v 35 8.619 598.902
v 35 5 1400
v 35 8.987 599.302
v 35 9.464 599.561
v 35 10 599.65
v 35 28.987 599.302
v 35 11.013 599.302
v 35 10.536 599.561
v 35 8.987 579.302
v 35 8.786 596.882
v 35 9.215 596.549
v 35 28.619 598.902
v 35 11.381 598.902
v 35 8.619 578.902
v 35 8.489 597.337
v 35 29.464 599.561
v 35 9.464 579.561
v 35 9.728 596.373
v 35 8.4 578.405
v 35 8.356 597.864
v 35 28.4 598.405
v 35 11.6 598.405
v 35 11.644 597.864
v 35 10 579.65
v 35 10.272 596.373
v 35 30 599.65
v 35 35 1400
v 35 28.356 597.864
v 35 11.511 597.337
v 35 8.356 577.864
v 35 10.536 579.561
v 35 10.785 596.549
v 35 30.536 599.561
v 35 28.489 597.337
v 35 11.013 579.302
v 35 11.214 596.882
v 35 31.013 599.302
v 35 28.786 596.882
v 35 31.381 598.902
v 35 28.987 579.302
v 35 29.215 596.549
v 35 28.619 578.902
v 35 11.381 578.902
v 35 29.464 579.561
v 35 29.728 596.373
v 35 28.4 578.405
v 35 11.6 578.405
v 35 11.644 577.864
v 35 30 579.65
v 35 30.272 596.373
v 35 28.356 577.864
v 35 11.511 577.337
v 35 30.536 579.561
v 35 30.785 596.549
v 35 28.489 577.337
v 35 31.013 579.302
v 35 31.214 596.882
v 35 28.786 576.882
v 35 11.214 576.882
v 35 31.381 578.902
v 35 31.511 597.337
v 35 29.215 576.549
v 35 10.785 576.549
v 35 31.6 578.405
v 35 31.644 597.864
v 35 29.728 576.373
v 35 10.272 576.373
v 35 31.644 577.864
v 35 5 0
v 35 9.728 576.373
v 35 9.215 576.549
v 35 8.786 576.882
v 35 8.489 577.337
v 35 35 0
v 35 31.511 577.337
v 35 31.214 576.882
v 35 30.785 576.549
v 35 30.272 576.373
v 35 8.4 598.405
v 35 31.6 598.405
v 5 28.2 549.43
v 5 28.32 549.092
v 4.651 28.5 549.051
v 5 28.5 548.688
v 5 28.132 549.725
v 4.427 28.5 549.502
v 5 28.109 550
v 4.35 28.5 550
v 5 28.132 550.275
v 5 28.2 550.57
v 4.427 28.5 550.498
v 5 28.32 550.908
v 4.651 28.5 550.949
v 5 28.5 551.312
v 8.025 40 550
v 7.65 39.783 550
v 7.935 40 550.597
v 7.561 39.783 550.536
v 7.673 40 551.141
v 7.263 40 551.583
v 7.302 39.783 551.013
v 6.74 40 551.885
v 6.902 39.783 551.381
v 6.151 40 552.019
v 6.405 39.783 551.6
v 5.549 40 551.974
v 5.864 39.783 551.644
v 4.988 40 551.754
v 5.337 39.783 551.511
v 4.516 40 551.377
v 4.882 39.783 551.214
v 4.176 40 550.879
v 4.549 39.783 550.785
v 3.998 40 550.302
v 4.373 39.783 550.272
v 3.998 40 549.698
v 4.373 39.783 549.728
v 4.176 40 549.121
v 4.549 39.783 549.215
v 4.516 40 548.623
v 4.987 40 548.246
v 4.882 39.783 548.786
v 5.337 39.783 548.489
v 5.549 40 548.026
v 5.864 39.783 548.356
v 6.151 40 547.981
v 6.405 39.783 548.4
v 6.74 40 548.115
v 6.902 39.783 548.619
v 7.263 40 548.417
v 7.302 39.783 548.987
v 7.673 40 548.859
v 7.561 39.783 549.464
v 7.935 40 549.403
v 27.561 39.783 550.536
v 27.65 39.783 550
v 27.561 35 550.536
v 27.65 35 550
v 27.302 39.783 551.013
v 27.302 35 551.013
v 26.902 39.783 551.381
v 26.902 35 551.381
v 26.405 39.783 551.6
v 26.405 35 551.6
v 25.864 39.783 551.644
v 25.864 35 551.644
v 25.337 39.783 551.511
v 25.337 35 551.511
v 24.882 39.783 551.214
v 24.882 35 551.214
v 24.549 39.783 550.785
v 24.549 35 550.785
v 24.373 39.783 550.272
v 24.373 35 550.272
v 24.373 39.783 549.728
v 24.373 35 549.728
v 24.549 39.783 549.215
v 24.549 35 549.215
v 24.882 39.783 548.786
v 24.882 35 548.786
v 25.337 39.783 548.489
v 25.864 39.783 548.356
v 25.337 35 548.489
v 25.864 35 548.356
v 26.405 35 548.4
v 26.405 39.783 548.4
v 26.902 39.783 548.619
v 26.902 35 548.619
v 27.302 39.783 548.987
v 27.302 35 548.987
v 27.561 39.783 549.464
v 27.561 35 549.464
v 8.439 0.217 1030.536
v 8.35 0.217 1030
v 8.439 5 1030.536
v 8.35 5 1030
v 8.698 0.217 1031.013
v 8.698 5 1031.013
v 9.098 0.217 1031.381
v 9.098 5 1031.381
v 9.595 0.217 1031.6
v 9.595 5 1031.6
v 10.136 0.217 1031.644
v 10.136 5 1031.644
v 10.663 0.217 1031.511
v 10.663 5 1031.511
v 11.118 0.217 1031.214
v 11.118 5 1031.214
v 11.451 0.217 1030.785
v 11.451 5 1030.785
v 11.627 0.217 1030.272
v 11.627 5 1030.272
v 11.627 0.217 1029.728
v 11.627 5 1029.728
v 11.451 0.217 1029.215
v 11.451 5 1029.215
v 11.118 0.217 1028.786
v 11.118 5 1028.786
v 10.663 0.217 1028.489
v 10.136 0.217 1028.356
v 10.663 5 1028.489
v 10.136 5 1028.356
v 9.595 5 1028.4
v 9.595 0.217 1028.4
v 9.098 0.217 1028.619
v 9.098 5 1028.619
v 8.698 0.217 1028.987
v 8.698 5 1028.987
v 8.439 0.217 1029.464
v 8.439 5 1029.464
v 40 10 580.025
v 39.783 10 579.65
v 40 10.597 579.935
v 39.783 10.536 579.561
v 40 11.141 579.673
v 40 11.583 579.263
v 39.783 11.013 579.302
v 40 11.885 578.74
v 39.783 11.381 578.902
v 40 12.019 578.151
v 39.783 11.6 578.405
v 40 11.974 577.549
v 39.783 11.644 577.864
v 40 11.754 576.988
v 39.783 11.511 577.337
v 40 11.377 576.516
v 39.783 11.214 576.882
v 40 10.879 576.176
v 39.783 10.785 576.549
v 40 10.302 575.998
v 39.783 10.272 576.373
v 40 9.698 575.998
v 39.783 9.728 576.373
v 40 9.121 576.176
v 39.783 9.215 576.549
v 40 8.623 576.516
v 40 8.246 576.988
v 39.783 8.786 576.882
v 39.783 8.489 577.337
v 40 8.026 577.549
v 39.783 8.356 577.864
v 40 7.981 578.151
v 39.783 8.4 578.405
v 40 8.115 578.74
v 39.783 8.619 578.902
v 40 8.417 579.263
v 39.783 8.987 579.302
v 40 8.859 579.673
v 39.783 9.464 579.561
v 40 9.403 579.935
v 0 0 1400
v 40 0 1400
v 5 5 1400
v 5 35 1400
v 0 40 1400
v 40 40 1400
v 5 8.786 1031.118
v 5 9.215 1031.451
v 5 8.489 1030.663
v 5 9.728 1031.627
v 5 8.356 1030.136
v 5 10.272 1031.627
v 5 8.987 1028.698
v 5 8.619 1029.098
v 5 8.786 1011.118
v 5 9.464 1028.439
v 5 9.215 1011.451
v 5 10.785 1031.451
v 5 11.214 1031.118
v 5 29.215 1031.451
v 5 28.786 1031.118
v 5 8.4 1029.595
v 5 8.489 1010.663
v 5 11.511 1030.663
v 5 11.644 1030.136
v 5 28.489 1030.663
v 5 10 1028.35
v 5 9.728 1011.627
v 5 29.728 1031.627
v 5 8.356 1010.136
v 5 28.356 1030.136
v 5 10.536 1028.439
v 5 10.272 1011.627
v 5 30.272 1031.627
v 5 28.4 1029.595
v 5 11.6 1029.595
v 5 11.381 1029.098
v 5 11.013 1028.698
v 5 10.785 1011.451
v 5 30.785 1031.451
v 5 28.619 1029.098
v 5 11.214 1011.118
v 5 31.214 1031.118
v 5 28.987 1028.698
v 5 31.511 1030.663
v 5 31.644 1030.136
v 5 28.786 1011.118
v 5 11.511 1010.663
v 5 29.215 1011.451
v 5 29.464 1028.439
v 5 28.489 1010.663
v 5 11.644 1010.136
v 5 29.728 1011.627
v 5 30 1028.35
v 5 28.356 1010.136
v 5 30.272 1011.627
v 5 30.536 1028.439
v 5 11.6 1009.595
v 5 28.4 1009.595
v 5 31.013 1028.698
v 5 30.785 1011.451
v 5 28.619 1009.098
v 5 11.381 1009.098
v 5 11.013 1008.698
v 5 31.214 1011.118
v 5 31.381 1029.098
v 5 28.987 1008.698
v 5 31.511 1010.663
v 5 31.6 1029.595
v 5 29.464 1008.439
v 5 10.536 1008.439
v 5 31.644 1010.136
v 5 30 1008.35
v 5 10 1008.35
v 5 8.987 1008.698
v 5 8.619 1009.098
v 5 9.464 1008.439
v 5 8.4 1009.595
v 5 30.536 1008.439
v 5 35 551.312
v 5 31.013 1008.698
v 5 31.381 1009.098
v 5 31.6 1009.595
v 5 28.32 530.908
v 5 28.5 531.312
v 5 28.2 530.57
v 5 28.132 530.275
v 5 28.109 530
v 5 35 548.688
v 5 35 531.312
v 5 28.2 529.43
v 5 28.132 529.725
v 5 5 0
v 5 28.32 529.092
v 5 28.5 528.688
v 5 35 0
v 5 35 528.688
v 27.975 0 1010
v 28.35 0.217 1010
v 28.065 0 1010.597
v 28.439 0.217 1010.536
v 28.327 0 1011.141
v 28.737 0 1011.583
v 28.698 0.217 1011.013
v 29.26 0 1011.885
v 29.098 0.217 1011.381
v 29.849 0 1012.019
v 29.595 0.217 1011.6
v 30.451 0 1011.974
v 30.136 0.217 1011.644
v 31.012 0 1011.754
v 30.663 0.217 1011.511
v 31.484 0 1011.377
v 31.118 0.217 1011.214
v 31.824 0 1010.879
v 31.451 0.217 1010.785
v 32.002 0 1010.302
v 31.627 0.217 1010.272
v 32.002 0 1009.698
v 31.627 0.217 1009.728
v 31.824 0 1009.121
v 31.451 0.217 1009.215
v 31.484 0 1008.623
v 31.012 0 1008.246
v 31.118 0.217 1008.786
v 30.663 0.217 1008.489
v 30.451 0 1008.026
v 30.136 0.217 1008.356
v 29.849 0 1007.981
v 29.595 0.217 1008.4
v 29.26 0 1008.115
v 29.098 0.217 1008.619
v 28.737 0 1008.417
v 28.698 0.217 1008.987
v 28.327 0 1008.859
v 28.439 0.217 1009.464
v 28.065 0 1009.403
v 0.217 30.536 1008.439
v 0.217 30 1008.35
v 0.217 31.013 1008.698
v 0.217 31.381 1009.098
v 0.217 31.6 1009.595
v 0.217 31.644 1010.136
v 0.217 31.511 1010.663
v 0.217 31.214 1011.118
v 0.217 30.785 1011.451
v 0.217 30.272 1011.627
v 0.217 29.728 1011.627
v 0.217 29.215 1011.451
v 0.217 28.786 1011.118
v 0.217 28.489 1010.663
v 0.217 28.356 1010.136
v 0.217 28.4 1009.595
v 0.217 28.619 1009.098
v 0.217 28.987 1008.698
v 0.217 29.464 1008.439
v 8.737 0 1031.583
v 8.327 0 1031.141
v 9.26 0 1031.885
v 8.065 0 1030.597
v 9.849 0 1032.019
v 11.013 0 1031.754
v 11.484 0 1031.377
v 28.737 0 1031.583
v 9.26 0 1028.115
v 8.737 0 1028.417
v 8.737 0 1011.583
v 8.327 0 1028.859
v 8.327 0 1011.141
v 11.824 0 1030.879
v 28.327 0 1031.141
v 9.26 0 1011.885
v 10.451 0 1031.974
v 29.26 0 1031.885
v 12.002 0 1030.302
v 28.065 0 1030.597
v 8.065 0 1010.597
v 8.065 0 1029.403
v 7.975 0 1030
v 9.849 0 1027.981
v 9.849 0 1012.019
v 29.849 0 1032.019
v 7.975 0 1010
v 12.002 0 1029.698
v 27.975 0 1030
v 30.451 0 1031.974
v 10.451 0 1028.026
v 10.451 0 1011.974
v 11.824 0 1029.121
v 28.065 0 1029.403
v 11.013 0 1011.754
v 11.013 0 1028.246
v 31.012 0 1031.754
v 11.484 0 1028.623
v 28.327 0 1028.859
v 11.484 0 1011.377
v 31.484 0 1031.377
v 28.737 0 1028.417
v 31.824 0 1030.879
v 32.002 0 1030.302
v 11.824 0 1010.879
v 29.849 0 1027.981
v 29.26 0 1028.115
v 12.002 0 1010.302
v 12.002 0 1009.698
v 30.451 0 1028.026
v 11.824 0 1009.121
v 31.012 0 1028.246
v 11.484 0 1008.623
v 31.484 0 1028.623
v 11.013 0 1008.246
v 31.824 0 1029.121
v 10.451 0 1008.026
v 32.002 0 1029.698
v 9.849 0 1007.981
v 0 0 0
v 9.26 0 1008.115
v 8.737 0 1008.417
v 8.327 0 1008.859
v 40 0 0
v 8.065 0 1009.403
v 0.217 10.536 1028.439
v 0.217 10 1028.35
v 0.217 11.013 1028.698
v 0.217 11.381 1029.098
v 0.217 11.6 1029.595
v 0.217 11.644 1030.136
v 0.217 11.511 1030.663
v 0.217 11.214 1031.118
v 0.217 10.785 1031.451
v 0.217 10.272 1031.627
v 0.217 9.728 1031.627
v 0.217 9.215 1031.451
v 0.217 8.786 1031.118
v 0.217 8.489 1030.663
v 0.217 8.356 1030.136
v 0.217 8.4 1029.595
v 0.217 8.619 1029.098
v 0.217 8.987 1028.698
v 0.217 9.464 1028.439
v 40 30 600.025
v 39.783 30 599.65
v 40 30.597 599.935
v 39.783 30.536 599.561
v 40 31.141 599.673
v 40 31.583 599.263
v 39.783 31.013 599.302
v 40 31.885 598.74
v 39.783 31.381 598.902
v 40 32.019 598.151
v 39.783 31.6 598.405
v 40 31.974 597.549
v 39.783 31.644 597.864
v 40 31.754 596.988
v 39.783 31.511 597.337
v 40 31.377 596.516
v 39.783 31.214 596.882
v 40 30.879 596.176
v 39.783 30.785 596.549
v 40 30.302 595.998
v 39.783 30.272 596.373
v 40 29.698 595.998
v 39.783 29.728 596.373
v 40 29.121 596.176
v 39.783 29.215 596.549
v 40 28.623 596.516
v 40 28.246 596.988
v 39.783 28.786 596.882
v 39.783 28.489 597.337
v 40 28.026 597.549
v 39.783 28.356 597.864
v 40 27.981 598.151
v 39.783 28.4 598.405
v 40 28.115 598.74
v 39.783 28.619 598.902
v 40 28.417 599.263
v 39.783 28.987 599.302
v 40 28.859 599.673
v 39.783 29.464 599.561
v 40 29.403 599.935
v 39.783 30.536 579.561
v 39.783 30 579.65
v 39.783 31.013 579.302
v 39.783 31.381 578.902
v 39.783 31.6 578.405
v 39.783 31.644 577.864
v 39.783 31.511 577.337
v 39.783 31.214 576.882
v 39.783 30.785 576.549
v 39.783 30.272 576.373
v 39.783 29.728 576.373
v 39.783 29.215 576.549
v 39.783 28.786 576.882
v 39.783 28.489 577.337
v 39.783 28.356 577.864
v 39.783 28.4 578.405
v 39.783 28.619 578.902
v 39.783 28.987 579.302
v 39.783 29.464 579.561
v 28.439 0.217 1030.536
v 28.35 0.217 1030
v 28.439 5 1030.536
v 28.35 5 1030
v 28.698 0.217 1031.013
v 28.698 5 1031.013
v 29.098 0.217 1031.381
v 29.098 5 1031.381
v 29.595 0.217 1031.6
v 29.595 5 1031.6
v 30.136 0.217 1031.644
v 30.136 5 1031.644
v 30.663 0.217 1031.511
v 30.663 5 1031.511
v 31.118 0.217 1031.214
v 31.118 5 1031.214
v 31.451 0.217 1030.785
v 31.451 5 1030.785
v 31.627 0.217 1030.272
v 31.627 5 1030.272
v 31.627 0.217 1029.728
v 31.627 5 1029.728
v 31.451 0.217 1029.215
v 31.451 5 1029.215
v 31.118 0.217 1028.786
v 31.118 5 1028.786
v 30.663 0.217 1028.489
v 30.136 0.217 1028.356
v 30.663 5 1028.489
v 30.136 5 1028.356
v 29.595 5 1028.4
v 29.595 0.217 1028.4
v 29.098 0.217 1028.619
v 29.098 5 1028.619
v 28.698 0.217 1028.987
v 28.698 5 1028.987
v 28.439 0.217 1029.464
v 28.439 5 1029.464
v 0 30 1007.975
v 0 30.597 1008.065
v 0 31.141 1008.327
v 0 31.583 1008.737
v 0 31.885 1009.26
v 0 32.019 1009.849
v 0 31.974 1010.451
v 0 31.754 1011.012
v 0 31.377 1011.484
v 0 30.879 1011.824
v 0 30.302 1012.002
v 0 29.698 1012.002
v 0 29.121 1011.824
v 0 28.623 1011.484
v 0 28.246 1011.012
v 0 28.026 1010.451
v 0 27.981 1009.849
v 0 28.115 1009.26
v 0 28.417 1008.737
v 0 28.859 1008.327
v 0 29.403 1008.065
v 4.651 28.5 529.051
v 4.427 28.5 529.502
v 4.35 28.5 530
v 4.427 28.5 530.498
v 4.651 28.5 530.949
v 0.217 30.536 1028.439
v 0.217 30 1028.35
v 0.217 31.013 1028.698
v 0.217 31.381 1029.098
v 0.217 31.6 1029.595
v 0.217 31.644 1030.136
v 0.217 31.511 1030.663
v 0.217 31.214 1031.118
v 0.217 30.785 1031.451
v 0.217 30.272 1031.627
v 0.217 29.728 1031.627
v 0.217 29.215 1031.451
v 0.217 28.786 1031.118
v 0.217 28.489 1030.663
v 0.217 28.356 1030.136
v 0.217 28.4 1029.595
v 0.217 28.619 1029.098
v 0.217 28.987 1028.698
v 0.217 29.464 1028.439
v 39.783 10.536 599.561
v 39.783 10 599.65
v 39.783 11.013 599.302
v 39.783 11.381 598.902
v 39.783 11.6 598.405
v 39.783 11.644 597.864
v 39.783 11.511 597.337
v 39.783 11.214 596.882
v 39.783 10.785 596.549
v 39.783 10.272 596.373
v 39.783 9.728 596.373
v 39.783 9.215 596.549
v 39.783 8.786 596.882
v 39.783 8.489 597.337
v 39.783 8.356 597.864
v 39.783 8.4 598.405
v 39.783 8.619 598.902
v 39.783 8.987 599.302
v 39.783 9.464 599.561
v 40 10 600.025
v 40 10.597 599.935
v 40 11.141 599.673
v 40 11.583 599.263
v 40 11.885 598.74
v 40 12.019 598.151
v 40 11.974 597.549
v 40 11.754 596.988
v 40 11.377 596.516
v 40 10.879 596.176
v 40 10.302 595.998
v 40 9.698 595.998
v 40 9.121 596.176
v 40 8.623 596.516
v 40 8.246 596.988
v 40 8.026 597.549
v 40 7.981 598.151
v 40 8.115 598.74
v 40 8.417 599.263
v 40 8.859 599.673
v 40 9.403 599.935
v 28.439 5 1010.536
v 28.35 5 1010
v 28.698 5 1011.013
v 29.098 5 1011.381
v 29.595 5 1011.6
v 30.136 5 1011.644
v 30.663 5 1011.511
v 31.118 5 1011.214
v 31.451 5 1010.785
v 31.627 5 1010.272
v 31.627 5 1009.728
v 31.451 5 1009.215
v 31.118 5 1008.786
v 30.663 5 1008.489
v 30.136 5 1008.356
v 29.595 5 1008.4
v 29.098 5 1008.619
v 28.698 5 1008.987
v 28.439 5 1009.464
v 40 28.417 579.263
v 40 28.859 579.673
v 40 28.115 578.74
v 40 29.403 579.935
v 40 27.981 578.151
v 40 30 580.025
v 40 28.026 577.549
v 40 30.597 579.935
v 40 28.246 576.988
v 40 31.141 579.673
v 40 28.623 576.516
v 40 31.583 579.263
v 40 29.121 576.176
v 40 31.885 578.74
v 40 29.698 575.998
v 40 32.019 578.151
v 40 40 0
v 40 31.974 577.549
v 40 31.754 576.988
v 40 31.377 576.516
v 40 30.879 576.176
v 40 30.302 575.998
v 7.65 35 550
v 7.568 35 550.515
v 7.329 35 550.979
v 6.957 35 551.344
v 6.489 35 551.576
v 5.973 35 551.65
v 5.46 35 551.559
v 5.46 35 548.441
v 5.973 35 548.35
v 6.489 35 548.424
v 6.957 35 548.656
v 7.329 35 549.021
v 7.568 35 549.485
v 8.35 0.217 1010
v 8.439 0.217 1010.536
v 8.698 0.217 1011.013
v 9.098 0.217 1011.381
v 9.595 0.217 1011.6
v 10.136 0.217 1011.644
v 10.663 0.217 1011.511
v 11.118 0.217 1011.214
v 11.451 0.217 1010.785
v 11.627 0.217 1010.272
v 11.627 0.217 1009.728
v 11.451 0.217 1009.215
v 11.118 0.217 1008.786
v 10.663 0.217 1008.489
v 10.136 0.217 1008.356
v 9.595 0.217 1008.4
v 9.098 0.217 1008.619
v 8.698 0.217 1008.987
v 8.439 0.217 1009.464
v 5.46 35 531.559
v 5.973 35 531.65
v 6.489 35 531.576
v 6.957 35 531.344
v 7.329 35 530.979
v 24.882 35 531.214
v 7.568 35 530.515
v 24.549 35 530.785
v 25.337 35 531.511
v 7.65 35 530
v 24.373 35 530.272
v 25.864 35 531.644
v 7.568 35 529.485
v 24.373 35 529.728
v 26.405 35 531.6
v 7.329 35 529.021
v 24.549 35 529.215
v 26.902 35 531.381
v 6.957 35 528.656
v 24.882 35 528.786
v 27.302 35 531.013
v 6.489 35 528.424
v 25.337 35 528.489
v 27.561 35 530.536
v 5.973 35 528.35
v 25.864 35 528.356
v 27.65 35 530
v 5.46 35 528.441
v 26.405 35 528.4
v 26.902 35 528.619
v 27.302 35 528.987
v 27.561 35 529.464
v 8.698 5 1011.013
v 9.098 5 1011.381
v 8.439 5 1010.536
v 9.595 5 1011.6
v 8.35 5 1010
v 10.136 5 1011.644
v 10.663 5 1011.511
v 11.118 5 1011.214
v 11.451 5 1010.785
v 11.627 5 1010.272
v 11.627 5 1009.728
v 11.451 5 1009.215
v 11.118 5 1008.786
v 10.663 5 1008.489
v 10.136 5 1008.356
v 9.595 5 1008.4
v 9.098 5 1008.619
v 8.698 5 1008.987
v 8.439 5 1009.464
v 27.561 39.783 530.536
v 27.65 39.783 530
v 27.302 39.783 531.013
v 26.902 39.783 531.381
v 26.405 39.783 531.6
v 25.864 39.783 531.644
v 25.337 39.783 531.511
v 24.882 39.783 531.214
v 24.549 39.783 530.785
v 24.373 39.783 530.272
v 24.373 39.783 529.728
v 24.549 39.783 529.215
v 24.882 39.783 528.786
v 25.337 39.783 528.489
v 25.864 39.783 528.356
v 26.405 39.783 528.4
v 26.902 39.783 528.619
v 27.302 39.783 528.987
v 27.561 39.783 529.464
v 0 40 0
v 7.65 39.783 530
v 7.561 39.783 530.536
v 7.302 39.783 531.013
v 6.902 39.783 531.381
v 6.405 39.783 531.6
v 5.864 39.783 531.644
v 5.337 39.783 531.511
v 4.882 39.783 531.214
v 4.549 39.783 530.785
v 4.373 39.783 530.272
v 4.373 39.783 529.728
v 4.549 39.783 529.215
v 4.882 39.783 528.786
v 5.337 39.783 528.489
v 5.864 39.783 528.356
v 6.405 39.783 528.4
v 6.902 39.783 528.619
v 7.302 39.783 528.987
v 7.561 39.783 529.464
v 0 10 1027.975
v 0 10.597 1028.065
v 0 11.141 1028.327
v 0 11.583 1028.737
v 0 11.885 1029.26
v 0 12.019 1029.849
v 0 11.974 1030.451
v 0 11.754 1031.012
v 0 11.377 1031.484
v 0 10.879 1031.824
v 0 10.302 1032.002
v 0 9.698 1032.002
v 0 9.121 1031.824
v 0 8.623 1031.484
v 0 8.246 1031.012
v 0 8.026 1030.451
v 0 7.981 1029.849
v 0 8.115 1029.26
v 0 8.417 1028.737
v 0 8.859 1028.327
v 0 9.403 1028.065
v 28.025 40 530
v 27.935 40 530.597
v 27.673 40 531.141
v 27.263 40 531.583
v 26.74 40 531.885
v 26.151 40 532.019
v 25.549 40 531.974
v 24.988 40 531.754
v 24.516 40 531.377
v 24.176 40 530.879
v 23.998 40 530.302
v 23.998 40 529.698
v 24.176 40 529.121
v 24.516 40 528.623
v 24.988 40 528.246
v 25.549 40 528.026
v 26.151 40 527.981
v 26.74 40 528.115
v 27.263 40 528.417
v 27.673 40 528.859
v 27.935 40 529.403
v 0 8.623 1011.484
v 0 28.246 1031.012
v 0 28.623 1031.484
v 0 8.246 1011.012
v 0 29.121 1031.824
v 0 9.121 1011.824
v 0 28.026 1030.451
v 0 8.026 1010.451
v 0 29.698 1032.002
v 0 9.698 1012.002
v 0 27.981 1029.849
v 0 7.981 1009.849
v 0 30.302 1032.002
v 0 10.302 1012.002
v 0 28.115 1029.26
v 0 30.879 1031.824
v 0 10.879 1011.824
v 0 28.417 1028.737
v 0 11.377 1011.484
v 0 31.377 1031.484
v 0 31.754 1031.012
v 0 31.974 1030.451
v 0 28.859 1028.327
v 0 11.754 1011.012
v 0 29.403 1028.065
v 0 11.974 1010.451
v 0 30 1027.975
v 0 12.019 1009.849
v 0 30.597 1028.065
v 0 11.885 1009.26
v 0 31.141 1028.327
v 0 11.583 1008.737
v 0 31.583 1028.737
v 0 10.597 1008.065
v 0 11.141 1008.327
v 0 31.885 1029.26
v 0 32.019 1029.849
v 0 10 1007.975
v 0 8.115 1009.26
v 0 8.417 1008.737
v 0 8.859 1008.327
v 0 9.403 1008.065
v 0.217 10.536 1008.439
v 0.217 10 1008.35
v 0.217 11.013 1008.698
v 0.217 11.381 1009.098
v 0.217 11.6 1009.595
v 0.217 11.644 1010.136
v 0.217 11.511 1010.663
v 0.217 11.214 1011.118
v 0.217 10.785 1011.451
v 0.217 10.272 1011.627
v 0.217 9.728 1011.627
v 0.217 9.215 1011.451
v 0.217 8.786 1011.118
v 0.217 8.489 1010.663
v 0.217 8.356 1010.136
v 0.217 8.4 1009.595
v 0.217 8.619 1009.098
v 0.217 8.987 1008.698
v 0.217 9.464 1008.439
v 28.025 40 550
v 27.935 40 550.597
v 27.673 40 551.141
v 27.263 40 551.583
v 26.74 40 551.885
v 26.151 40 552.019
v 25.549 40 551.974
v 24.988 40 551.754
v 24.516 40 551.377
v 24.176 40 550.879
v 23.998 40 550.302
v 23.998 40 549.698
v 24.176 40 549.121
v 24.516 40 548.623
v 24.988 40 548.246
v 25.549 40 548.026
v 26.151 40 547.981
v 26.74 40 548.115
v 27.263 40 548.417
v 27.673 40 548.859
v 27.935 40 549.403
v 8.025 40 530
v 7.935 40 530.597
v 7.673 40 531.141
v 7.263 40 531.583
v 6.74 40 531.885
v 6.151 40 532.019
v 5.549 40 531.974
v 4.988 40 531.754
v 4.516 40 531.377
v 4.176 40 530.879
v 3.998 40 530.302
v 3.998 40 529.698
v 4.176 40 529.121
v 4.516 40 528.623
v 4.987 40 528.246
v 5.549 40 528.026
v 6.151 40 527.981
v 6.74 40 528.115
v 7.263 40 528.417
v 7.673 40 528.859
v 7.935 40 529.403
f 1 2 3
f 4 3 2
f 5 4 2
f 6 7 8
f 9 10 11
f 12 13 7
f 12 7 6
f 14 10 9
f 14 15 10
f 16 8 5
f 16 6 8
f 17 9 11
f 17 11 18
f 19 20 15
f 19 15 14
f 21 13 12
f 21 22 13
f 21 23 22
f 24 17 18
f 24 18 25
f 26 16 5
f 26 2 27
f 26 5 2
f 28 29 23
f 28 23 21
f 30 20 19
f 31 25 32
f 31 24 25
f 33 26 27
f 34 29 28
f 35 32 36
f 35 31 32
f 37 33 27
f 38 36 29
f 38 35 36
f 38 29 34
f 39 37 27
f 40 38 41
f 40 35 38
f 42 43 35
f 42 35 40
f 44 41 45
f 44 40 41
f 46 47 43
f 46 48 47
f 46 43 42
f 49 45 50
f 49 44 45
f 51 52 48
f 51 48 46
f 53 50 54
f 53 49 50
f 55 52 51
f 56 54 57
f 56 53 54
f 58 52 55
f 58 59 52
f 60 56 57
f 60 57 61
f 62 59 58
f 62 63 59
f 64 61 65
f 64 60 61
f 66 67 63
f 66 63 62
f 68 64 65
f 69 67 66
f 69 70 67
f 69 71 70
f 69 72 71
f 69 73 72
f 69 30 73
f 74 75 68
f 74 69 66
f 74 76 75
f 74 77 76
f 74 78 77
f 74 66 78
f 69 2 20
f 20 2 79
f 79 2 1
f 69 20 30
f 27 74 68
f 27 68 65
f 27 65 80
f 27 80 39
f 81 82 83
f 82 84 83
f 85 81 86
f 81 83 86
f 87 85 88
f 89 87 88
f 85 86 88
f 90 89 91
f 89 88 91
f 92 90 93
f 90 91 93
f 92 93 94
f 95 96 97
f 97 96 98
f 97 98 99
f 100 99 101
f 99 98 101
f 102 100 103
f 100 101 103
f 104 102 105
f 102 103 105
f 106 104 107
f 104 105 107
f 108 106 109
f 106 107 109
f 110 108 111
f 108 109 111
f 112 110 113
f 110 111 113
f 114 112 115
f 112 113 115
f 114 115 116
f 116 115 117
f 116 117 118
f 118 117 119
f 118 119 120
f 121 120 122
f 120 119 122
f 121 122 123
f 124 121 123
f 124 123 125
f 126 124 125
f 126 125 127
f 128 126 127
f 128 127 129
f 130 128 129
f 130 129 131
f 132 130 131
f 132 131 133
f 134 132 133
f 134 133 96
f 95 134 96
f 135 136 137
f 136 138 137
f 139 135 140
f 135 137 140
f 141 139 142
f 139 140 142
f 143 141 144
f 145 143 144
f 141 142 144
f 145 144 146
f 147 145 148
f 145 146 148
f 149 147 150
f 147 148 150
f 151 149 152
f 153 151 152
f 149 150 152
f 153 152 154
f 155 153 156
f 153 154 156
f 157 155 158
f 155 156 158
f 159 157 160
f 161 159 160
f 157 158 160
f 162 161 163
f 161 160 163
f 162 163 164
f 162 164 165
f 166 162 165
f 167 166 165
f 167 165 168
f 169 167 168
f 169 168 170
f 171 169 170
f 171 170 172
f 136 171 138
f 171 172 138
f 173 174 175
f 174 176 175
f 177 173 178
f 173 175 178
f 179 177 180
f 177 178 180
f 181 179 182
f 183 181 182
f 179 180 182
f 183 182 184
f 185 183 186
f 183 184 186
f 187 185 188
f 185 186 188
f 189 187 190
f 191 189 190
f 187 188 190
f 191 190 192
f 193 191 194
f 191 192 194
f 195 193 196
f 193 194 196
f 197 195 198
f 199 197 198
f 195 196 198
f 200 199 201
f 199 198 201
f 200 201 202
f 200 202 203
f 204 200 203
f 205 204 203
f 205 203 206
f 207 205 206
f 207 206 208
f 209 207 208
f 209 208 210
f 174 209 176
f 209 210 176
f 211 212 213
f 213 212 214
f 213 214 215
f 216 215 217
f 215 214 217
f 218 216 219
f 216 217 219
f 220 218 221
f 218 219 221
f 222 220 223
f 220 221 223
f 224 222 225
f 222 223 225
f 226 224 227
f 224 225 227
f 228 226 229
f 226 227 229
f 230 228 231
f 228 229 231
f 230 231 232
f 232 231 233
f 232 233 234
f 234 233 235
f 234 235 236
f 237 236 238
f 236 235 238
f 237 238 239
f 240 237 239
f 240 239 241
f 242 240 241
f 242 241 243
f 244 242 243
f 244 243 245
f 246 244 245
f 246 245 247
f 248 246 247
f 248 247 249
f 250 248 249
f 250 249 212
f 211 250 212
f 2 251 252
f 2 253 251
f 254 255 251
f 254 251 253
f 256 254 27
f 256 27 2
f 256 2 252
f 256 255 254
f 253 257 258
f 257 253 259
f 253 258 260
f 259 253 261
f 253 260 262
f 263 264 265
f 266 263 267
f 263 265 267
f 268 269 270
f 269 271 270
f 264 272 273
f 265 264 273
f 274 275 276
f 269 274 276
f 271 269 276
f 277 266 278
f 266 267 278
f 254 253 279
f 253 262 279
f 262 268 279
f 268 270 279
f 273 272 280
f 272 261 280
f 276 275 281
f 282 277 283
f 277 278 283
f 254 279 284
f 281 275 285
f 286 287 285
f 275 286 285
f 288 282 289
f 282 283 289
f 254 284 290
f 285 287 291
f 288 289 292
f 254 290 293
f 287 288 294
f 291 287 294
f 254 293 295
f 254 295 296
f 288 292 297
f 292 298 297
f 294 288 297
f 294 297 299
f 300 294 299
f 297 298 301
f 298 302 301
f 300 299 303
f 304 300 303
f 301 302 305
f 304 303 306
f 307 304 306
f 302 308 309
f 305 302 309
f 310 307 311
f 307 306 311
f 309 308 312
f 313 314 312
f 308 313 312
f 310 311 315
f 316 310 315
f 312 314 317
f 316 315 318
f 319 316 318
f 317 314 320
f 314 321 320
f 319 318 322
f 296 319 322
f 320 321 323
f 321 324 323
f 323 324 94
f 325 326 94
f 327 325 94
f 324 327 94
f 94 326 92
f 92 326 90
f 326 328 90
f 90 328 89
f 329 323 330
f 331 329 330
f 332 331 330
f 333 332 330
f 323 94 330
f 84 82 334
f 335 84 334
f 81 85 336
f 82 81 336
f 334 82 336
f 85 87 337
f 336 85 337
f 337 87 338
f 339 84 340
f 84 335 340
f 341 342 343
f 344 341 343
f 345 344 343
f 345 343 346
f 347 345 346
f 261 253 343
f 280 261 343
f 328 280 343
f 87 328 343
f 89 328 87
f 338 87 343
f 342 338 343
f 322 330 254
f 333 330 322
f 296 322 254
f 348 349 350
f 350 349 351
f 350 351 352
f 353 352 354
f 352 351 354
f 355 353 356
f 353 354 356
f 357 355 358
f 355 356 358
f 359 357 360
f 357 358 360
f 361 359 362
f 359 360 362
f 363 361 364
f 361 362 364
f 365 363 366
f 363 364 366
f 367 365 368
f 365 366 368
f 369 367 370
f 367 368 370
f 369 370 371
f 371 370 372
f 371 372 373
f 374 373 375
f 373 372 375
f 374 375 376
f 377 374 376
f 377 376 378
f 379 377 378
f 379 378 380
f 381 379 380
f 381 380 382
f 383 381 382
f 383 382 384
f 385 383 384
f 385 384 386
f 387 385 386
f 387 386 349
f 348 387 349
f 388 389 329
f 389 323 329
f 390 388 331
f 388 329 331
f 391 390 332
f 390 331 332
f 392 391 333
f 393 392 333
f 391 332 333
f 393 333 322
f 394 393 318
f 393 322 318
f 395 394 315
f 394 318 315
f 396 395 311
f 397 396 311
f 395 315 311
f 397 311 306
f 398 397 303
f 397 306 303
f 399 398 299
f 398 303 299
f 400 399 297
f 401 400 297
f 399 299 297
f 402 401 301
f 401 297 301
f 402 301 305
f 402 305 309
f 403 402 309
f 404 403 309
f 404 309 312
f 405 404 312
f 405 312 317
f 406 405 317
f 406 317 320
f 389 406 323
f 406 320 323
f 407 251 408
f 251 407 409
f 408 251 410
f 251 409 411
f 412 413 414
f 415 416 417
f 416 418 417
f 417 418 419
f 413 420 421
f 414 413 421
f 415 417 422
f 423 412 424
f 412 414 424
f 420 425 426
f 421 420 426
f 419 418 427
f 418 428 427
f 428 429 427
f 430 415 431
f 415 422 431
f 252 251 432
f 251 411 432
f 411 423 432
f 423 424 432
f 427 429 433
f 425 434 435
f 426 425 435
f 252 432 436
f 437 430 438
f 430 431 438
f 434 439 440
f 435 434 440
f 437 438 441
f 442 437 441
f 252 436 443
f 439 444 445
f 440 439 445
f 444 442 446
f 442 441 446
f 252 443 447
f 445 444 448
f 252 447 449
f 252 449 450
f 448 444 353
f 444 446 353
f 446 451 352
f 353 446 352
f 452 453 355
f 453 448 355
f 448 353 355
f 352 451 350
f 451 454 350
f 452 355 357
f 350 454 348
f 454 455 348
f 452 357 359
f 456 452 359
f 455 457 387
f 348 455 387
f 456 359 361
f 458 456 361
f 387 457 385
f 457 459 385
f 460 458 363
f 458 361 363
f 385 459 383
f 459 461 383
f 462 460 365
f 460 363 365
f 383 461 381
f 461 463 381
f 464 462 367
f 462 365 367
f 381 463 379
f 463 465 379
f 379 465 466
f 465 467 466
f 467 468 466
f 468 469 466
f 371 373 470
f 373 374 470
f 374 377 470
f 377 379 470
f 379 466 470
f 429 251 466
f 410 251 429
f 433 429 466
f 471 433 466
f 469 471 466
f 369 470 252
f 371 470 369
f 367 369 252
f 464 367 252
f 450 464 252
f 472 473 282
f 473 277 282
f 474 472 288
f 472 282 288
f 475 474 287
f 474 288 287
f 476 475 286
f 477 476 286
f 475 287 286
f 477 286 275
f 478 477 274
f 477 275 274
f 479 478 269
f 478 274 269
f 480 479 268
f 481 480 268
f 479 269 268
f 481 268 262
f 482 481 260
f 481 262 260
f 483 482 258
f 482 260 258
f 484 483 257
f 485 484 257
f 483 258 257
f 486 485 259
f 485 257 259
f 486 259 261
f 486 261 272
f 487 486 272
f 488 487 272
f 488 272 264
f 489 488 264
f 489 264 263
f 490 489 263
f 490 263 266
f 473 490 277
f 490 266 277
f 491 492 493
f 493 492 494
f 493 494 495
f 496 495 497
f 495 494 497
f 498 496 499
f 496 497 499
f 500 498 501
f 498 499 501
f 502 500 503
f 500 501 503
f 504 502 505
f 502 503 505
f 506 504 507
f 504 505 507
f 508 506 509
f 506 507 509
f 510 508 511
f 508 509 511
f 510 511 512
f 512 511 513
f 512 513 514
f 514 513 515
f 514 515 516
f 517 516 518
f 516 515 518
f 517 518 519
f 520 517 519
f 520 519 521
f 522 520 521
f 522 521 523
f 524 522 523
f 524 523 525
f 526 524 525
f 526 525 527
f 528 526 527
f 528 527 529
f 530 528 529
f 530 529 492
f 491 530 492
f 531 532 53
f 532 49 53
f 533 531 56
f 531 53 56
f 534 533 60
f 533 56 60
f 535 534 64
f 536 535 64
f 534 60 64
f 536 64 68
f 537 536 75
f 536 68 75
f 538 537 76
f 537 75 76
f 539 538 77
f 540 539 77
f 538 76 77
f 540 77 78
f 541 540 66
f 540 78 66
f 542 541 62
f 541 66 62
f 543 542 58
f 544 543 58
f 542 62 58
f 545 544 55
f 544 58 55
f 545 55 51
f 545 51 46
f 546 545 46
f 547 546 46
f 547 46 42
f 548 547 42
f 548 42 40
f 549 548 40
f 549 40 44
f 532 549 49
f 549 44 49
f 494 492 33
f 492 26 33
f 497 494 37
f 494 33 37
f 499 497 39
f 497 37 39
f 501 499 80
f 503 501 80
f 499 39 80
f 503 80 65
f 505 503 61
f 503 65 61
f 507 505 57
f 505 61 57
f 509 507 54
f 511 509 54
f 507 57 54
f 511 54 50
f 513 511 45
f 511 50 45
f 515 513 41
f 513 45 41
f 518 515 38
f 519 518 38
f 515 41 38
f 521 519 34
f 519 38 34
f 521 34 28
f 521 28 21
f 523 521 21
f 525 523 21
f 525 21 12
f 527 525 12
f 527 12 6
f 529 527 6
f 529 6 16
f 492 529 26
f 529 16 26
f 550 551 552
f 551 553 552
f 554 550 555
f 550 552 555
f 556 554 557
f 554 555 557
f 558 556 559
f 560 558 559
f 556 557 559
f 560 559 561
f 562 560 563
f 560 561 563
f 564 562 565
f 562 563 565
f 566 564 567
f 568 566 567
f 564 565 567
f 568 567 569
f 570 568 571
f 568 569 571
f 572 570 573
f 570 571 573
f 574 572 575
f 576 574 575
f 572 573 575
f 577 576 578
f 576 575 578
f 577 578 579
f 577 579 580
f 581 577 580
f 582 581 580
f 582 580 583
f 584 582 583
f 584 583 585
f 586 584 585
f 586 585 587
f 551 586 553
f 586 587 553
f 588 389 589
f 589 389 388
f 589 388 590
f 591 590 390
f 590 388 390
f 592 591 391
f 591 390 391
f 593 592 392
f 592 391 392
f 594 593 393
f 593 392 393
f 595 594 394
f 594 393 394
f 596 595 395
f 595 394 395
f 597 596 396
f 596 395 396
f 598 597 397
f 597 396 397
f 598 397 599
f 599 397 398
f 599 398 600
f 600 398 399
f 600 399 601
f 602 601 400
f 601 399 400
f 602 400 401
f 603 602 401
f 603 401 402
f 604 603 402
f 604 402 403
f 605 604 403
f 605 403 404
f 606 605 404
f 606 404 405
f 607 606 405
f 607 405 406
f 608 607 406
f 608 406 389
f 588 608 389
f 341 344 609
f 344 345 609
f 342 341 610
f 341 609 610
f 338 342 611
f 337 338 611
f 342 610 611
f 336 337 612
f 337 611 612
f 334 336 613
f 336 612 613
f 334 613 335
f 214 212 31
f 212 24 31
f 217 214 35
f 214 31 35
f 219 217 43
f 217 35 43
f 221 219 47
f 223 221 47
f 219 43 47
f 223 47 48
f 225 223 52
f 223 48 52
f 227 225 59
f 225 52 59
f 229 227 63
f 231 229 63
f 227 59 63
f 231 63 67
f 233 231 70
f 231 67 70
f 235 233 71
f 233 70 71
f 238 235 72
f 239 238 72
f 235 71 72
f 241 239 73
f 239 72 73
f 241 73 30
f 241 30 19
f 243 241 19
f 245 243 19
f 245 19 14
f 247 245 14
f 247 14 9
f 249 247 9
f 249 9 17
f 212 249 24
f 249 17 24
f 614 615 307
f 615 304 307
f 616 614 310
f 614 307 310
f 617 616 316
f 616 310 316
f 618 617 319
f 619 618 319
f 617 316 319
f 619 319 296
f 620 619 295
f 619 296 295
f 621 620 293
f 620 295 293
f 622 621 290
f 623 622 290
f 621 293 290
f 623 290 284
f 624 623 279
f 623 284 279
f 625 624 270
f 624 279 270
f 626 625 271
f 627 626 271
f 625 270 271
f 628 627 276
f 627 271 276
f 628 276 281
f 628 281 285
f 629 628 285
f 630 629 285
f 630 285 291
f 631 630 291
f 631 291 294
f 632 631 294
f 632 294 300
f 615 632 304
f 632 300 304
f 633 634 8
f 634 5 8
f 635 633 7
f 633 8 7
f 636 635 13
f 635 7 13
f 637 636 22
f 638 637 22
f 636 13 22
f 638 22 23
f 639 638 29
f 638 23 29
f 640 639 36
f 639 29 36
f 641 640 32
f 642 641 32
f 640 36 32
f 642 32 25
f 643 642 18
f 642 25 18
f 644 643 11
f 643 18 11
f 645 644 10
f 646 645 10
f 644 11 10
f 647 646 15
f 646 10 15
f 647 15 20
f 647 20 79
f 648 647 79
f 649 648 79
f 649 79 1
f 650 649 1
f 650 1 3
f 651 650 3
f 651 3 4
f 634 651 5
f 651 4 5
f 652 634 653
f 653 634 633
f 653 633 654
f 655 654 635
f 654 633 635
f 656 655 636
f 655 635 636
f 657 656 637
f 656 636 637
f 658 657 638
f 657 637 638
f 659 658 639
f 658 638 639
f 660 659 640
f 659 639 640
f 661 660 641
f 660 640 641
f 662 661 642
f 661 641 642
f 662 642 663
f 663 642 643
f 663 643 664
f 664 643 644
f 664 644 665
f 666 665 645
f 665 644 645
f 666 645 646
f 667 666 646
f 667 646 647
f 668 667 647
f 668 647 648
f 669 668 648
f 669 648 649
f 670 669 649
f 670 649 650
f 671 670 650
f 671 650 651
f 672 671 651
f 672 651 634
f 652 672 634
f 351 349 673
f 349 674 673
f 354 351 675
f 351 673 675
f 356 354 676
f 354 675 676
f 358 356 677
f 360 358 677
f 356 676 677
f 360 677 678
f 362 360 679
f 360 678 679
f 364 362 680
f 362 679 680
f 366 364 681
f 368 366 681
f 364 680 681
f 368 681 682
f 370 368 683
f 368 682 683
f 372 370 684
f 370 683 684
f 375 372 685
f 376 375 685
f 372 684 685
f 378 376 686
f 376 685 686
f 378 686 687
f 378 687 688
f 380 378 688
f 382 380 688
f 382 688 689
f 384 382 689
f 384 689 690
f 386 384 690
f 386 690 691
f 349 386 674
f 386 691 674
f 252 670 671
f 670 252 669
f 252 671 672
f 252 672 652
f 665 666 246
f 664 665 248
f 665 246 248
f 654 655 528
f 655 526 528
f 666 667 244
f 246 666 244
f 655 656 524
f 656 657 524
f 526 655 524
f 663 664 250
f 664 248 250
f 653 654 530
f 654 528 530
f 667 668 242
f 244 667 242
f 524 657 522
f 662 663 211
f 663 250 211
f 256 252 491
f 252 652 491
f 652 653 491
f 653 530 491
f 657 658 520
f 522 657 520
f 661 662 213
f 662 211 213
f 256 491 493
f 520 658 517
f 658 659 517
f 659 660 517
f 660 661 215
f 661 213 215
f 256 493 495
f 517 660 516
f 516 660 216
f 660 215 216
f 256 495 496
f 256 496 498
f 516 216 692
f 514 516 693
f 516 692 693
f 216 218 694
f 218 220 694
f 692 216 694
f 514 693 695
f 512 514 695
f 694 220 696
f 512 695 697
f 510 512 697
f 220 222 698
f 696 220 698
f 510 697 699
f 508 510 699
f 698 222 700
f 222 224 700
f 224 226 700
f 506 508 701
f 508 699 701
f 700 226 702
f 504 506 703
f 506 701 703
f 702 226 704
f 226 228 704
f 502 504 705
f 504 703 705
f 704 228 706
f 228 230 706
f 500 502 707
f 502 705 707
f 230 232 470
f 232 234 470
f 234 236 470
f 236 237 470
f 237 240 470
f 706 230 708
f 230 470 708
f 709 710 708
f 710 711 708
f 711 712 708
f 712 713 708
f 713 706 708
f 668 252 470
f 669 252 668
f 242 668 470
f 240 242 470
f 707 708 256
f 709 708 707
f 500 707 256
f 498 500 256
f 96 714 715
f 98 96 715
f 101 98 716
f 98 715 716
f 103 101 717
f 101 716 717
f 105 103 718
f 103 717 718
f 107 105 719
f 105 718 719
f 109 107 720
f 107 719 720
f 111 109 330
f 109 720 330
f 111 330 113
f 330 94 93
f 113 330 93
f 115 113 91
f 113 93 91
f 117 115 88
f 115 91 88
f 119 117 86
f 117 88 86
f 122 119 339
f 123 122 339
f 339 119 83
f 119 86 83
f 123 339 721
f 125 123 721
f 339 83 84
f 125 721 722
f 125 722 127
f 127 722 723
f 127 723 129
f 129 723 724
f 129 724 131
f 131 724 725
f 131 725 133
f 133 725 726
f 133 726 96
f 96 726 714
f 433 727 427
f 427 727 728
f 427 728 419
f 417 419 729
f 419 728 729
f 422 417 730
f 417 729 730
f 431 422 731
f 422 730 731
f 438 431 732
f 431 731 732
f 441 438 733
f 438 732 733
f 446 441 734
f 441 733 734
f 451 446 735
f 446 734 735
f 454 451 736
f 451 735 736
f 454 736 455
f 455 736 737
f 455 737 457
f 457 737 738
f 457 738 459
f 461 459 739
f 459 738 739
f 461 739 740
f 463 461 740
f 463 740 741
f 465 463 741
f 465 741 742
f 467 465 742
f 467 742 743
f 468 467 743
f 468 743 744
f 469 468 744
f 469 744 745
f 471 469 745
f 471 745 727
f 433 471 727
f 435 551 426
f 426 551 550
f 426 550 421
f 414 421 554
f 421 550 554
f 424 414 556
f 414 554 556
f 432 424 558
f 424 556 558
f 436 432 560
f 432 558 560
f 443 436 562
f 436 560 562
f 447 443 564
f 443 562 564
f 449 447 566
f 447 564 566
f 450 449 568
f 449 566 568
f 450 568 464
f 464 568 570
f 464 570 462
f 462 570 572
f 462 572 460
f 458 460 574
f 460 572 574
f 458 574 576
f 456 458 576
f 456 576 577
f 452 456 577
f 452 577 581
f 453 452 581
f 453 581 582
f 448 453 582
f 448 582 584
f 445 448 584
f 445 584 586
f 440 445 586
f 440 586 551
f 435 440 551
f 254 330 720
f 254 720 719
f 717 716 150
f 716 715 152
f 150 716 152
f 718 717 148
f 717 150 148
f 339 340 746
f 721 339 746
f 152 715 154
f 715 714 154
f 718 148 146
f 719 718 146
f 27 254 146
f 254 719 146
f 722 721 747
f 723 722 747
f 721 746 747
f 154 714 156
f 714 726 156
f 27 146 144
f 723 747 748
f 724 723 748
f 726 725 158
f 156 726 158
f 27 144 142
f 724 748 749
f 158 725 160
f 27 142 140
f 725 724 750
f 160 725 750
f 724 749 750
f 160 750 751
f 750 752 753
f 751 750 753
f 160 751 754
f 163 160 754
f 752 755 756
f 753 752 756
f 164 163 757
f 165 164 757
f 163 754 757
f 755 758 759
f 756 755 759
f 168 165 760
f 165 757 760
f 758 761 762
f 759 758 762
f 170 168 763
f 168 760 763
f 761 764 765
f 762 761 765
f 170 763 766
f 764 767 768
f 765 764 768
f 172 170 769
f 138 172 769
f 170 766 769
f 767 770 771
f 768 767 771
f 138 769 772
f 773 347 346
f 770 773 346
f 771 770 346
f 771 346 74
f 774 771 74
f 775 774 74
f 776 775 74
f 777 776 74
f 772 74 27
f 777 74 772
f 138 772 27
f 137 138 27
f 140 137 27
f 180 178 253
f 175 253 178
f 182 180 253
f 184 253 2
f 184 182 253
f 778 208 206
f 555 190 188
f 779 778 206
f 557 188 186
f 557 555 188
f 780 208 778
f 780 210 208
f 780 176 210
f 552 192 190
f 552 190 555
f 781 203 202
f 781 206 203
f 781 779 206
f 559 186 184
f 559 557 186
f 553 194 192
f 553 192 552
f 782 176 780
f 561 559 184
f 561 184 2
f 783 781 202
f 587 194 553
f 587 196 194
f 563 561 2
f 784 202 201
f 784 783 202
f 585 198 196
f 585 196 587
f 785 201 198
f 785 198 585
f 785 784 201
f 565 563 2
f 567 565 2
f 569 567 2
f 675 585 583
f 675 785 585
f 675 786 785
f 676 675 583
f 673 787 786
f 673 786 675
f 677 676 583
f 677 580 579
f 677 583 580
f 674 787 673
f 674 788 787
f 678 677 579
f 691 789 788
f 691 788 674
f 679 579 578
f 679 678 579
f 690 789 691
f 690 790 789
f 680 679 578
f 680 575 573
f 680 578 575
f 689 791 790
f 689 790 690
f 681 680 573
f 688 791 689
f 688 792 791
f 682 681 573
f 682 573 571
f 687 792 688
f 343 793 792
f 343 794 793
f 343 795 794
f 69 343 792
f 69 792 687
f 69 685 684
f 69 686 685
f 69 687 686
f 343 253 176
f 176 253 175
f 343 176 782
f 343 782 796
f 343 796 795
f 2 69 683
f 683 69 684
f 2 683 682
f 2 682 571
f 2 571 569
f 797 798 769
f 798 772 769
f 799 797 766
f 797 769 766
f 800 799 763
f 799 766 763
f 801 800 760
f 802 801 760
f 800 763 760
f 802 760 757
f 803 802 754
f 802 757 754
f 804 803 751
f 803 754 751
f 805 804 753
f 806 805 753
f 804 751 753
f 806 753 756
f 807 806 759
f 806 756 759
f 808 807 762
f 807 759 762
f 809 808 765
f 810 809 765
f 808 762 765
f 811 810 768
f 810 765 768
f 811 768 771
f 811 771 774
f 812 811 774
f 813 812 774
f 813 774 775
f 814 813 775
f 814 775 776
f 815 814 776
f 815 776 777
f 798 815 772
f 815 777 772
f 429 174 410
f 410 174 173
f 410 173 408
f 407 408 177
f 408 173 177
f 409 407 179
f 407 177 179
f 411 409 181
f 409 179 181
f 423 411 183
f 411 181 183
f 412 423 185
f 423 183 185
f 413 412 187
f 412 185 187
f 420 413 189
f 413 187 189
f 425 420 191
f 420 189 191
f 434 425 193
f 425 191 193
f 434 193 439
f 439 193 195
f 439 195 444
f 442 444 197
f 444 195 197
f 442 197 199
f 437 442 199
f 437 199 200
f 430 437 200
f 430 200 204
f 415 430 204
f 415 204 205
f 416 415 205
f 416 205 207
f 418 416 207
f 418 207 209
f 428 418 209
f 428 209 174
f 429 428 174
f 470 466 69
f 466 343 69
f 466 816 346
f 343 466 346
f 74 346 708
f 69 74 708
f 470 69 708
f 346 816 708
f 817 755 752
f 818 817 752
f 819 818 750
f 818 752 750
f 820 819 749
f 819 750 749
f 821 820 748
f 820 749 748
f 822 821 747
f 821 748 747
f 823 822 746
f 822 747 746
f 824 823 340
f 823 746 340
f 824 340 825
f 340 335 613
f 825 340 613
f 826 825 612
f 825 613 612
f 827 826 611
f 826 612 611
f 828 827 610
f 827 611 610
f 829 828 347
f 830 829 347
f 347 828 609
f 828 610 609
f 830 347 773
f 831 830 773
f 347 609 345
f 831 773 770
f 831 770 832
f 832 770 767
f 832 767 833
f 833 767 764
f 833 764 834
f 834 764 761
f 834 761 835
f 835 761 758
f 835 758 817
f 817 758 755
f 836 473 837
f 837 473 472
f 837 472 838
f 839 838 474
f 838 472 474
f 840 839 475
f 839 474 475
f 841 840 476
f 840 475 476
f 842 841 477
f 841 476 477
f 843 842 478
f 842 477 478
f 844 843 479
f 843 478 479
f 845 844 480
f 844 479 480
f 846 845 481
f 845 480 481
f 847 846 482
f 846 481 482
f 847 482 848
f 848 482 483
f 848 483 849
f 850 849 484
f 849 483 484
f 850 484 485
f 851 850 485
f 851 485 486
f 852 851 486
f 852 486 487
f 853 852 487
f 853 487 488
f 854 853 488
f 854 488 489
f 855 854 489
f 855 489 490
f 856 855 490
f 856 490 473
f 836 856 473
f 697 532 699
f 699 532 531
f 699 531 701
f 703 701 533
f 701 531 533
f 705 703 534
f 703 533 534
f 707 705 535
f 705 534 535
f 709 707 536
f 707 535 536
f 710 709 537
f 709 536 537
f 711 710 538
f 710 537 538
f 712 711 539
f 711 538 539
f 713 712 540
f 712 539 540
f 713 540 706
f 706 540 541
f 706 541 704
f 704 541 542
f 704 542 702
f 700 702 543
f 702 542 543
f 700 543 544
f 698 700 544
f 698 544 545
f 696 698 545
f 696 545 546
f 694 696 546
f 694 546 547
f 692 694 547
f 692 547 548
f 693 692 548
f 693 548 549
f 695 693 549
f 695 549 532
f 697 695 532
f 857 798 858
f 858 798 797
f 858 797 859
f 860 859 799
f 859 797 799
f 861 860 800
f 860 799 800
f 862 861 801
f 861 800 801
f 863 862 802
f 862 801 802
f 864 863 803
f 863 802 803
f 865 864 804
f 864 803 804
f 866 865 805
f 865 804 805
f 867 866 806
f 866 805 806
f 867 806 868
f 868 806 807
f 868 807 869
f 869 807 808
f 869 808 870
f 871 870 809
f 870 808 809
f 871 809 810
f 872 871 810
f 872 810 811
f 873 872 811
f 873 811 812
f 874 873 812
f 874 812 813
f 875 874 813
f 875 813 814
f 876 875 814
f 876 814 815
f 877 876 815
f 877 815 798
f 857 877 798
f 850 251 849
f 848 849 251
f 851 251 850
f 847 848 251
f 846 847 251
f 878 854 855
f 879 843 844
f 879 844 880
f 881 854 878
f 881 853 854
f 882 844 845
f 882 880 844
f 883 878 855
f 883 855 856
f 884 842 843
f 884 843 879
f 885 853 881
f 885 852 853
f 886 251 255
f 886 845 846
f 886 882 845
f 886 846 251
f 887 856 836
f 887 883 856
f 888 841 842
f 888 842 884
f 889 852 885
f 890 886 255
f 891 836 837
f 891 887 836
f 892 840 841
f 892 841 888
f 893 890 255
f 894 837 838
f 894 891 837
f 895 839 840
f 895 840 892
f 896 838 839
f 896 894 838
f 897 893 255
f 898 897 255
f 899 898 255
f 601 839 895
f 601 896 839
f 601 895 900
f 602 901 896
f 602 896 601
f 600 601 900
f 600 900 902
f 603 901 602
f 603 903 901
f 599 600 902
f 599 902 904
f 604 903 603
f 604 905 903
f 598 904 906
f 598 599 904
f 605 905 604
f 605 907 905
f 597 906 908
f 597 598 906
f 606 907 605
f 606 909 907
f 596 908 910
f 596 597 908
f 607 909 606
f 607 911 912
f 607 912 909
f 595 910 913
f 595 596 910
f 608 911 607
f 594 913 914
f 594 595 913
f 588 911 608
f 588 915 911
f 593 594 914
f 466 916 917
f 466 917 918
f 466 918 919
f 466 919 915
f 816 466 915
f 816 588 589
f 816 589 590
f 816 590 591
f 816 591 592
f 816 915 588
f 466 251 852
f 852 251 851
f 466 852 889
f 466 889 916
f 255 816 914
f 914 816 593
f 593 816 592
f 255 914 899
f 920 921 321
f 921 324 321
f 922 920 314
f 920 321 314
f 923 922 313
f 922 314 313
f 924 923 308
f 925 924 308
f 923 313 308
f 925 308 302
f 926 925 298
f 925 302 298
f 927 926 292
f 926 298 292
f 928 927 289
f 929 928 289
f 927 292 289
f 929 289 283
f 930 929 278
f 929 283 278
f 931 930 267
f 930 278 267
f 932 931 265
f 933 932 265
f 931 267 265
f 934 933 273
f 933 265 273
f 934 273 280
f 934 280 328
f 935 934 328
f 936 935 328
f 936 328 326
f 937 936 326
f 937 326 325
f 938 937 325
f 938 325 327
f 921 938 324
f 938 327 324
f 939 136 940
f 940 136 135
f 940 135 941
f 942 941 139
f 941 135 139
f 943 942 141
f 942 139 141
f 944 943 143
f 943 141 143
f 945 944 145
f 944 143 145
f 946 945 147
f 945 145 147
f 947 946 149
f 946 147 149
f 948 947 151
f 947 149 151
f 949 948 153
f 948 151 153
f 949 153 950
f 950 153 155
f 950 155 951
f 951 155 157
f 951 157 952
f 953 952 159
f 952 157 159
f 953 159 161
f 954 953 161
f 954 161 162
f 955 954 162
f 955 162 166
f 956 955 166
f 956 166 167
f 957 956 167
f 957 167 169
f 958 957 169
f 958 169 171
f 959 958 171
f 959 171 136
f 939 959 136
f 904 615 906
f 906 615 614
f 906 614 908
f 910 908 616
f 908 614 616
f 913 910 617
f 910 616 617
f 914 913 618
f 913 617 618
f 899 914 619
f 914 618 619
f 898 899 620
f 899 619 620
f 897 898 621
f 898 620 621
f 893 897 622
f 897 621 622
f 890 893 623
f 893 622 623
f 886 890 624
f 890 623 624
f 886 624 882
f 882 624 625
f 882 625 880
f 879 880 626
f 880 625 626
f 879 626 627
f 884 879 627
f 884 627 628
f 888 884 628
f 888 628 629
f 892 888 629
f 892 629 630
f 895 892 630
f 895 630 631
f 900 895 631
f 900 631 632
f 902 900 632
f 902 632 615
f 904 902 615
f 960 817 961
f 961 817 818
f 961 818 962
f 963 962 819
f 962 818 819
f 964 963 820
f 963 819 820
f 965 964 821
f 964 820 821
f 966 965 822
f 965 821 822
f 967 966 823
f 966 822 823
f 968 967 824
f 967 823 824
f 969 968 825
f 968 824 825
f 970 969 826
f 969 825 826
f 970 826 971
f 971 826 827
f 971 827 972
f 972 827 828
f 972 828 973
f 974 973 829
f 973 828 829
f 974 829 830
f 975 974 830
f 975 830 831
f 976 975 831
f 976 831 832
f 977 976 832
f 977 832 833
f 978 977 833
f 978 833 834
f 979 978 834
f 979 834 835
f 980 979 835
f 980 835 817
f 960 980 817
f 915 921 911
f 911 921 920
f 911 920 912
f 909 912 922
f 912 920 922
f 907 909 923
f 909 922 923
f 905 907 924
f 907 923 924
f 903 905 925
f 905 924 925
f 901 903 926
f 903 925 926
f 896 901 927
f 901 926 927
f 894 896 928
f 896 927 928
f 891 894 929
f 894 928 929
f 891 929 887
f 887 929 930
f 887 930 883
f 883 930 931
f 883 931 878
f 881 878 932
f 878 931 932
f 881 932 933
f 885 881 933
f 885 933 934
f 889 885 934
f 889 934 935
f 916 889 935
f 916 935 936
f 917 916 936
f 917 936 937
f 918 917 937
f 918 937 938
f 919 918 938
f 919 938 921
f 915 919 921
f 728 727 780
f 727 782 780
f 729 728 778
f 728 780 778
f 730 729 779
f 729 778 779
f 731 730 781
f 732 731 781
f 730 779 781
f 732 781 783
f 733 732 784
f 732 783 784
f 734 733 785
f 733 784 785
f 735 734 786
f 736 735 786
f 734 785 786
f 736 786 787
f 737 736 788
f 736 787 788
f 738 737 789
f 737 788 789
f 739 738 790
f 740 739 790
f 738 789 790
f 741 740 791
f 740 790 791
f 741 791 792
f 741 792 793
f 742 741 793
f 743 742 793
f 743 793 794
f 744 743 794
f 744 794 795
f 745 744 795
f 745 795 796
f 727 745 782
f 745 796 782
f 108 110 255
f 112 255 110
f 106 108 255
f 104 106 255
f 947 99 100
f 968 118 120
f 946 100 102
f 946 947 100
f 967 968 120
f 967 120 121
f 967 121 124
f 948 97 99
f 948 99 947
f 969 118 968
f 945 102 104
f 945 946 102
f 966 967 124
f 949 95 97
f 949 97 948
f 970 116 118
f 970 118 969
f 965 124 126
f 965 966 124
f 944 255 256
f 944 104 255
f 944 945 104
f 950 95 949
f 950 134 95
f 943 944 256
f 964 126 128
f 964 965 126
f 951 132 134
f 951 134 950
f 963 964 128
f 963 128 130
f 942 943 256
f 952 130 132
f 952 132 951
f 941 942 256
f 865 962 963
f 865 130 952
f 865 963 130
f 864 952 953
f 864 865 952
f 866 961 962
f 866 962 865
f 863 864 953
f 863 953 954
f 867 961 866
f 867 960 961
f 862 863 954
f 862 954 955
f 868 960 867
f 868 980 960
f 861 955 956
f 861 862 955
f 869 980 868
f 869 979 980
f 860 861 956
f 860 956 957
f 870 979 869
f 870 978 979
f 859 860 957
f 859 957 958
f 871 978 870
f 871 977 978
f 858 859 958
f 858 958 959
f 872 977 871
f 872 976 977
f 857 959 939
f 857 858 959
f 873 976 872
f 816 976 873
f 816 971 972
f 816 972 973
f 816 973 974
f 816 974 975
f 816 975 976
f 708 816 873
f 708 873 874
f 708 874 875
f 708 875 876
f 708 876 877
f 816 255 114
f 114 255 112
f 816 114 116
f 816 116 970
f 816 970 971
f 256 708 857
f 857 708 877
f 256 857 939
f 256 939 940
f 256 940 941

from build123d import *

# Parameters (mm, degrees)
SKETCH_1_W                  = 40
SKETCH_1_H                  = 40
SKETCH_1_W_2                = 30
SKETCH_1_H_2                = 30
EXTRUDE_1_DEPTH             = 1400
HOLE_WIZARD_M41_D           = 3.3
HOLE_WIZARD_M41_DEPTH       = 11.5
HOLE_WIZARD_M41_CSINK_D     = 4.05
HOLE_WIZARD_M41_CSINK_ANGLE = 120
HOLE_WIZARD_M41_TIP         = 0.991420021
HOLE_WIZARD_M42_D           = 3.3
HOLE_WIZARD_M42_DEPTH       = 11.5
HOLE_WIZARD_M42_CSINK_D     = 4.05
HOLE_WIZARD_M42_CSINK_ANGLE = 120
HOLE_WIZARD_M42_TIP         = 0.991420021
HOLE_WIZARD_M43_D           = 3.3
HOLE_WIZARD_M43_DEPTH       = 11.5
HOLE_WIZARD_M43_CSINK_D     = 4.05
HOLE_WIZARD_M43_CSINK_ANGLE = 120
HOLE_WIZARD_M43_TIP         = 0.991420021
HOLE_WIZARD_M44_D           = 3.3
HOLE_WIZARD_M44_DEPTH       = 11.5
HOLE_WIZARD_M44_CSINK_D     = 4.05
HOLE_WIZARD_M44_CSINK_ANGLE = 120
HOLE_WIZARD_M44_TIP         = 0.991420021


with BuildPart() as part:
    # Эскиз1 → Вытянуть-Тонкостенный1 (new body)
    with BuildSketch(Plane.XY):
        with Locations((20, 20)):
            Rectangle(SKETCH_1_W, SKETCH_1_H)
        with Locations((20, 20)):
            Rectangle(SKETCH_1_W_2, SKETCH_1_H_2, mode=Mode.SUBTRACT)
    extrude(amount=EXTRUDE_1_DEPTH)

    # Отверстие обработанное метчиком M41
    with Locations(Plane.ZY):
        with Locations((1030, 30), (1010, 30), (1030, 10), (1010, 10)):
            CounterSinkHole(HOLE_WIZARD_M41_D / 2, HOLE_WIZARD_M41_CSINK_D / 2, depth=HOLE_WIZARD_M41_DEPTH, counter_sink_angle=HOLE_WIZARD_M41_CSINK_ANGLE)
            with Locations((0, 0, -(HOLE_WIZARD_M41_DEPTH + HOLE_WIZARD_M41_TIP / 2))):  # 118° drill point
                Cone(0, HOLE_WIZARD_M41_D / 2, HOLE_WIZARD_M41_TIP, mode=Mode.SUBTRACT)

    # Отверстие обработанное метчиком M42
    with Locations(Plane(origin=(40, 0, 0), x_dir=(0, 0, -1), z_dir=(1, 0, 0))):
        with Locations((-598, 30), (-578, 30), (-598, 10), (-578, 10)):
            CounterSinkHole(HOLE_WIZARD_M42_D / 2, HOLE_WIZARD_M42_CSINK_D / 2, depth=HOLE_WIZARD_M42_DEPTH, counter_sink_angle=HOLE_WIZARD_M42_CSINK_ANGLE)
            with Locations((0, 0, -(HOLE_WIZARD_M42_DEPTH + HOLE_WIZARD_M42_TIP / 2))):  # 118° drill point
                Cone(0, HOLE_WIZARD_M42_D / 2, HOLE_WIZARD_M42_TIP, mode=Mode.SUBTRACT)

    # Отверстие обработанное метчиком M43
    with Locations(Plane.XZ):
        with Locations((30, 1030), (10, 1030), (30, 1010), (10, 1010)):
            CounterSinkHole(HOLE_WIZARD_M43_D / 2, HOLE_WIZARD_M43_CSINK_D / 2, depth=HOLE_WIZARD_M43_DEPTH, counter_sink_angle=HOLE_WIZARD_M43_CSINK_ANGLE)
            with Locations((0, 0, -(HOLE_WIZARD_M43_DEPTH + HOLE_WIZARD_M43_TIP / 2))):  # 118° drill point
                Cone(0, HOLE_WIZARD_M43_D / 2, HOLE_WIZARD_M43_TIP, mode=Mode.SUBTRACT)

    # Отверстие обработанное метчиком M44
    with Locations(Plane(origin=(0, 40, 0), x_dir=(-1, 0, 0), z_dir=(0, 1, 0))):
        with Locations((-6, 550), (-26, 550), (-6, 530), (-26, 530)):
            CounterSinkHole(HOLE_WIZARD_M44_D / 2, HOLE_WIZARD_M44_CSINK_D / 2, depth=HOLE_WIZARD_M44_DEPTH, counter_sink_angle=HOLE_WIZARD_M44_CSINK_ANGLE)
            with Locations((0, 0, -(HOLE_WIZARD_M44_DEPTH + HOLE_WIZARD_M44_TIP / 2))):  # 118° drill point
                Cone(0, HOLE_WIZARD_M44_D / 2, HOLE_WIZARD_M44_TIP, mode=Mode.SUBTRACT)


solid = part.part
